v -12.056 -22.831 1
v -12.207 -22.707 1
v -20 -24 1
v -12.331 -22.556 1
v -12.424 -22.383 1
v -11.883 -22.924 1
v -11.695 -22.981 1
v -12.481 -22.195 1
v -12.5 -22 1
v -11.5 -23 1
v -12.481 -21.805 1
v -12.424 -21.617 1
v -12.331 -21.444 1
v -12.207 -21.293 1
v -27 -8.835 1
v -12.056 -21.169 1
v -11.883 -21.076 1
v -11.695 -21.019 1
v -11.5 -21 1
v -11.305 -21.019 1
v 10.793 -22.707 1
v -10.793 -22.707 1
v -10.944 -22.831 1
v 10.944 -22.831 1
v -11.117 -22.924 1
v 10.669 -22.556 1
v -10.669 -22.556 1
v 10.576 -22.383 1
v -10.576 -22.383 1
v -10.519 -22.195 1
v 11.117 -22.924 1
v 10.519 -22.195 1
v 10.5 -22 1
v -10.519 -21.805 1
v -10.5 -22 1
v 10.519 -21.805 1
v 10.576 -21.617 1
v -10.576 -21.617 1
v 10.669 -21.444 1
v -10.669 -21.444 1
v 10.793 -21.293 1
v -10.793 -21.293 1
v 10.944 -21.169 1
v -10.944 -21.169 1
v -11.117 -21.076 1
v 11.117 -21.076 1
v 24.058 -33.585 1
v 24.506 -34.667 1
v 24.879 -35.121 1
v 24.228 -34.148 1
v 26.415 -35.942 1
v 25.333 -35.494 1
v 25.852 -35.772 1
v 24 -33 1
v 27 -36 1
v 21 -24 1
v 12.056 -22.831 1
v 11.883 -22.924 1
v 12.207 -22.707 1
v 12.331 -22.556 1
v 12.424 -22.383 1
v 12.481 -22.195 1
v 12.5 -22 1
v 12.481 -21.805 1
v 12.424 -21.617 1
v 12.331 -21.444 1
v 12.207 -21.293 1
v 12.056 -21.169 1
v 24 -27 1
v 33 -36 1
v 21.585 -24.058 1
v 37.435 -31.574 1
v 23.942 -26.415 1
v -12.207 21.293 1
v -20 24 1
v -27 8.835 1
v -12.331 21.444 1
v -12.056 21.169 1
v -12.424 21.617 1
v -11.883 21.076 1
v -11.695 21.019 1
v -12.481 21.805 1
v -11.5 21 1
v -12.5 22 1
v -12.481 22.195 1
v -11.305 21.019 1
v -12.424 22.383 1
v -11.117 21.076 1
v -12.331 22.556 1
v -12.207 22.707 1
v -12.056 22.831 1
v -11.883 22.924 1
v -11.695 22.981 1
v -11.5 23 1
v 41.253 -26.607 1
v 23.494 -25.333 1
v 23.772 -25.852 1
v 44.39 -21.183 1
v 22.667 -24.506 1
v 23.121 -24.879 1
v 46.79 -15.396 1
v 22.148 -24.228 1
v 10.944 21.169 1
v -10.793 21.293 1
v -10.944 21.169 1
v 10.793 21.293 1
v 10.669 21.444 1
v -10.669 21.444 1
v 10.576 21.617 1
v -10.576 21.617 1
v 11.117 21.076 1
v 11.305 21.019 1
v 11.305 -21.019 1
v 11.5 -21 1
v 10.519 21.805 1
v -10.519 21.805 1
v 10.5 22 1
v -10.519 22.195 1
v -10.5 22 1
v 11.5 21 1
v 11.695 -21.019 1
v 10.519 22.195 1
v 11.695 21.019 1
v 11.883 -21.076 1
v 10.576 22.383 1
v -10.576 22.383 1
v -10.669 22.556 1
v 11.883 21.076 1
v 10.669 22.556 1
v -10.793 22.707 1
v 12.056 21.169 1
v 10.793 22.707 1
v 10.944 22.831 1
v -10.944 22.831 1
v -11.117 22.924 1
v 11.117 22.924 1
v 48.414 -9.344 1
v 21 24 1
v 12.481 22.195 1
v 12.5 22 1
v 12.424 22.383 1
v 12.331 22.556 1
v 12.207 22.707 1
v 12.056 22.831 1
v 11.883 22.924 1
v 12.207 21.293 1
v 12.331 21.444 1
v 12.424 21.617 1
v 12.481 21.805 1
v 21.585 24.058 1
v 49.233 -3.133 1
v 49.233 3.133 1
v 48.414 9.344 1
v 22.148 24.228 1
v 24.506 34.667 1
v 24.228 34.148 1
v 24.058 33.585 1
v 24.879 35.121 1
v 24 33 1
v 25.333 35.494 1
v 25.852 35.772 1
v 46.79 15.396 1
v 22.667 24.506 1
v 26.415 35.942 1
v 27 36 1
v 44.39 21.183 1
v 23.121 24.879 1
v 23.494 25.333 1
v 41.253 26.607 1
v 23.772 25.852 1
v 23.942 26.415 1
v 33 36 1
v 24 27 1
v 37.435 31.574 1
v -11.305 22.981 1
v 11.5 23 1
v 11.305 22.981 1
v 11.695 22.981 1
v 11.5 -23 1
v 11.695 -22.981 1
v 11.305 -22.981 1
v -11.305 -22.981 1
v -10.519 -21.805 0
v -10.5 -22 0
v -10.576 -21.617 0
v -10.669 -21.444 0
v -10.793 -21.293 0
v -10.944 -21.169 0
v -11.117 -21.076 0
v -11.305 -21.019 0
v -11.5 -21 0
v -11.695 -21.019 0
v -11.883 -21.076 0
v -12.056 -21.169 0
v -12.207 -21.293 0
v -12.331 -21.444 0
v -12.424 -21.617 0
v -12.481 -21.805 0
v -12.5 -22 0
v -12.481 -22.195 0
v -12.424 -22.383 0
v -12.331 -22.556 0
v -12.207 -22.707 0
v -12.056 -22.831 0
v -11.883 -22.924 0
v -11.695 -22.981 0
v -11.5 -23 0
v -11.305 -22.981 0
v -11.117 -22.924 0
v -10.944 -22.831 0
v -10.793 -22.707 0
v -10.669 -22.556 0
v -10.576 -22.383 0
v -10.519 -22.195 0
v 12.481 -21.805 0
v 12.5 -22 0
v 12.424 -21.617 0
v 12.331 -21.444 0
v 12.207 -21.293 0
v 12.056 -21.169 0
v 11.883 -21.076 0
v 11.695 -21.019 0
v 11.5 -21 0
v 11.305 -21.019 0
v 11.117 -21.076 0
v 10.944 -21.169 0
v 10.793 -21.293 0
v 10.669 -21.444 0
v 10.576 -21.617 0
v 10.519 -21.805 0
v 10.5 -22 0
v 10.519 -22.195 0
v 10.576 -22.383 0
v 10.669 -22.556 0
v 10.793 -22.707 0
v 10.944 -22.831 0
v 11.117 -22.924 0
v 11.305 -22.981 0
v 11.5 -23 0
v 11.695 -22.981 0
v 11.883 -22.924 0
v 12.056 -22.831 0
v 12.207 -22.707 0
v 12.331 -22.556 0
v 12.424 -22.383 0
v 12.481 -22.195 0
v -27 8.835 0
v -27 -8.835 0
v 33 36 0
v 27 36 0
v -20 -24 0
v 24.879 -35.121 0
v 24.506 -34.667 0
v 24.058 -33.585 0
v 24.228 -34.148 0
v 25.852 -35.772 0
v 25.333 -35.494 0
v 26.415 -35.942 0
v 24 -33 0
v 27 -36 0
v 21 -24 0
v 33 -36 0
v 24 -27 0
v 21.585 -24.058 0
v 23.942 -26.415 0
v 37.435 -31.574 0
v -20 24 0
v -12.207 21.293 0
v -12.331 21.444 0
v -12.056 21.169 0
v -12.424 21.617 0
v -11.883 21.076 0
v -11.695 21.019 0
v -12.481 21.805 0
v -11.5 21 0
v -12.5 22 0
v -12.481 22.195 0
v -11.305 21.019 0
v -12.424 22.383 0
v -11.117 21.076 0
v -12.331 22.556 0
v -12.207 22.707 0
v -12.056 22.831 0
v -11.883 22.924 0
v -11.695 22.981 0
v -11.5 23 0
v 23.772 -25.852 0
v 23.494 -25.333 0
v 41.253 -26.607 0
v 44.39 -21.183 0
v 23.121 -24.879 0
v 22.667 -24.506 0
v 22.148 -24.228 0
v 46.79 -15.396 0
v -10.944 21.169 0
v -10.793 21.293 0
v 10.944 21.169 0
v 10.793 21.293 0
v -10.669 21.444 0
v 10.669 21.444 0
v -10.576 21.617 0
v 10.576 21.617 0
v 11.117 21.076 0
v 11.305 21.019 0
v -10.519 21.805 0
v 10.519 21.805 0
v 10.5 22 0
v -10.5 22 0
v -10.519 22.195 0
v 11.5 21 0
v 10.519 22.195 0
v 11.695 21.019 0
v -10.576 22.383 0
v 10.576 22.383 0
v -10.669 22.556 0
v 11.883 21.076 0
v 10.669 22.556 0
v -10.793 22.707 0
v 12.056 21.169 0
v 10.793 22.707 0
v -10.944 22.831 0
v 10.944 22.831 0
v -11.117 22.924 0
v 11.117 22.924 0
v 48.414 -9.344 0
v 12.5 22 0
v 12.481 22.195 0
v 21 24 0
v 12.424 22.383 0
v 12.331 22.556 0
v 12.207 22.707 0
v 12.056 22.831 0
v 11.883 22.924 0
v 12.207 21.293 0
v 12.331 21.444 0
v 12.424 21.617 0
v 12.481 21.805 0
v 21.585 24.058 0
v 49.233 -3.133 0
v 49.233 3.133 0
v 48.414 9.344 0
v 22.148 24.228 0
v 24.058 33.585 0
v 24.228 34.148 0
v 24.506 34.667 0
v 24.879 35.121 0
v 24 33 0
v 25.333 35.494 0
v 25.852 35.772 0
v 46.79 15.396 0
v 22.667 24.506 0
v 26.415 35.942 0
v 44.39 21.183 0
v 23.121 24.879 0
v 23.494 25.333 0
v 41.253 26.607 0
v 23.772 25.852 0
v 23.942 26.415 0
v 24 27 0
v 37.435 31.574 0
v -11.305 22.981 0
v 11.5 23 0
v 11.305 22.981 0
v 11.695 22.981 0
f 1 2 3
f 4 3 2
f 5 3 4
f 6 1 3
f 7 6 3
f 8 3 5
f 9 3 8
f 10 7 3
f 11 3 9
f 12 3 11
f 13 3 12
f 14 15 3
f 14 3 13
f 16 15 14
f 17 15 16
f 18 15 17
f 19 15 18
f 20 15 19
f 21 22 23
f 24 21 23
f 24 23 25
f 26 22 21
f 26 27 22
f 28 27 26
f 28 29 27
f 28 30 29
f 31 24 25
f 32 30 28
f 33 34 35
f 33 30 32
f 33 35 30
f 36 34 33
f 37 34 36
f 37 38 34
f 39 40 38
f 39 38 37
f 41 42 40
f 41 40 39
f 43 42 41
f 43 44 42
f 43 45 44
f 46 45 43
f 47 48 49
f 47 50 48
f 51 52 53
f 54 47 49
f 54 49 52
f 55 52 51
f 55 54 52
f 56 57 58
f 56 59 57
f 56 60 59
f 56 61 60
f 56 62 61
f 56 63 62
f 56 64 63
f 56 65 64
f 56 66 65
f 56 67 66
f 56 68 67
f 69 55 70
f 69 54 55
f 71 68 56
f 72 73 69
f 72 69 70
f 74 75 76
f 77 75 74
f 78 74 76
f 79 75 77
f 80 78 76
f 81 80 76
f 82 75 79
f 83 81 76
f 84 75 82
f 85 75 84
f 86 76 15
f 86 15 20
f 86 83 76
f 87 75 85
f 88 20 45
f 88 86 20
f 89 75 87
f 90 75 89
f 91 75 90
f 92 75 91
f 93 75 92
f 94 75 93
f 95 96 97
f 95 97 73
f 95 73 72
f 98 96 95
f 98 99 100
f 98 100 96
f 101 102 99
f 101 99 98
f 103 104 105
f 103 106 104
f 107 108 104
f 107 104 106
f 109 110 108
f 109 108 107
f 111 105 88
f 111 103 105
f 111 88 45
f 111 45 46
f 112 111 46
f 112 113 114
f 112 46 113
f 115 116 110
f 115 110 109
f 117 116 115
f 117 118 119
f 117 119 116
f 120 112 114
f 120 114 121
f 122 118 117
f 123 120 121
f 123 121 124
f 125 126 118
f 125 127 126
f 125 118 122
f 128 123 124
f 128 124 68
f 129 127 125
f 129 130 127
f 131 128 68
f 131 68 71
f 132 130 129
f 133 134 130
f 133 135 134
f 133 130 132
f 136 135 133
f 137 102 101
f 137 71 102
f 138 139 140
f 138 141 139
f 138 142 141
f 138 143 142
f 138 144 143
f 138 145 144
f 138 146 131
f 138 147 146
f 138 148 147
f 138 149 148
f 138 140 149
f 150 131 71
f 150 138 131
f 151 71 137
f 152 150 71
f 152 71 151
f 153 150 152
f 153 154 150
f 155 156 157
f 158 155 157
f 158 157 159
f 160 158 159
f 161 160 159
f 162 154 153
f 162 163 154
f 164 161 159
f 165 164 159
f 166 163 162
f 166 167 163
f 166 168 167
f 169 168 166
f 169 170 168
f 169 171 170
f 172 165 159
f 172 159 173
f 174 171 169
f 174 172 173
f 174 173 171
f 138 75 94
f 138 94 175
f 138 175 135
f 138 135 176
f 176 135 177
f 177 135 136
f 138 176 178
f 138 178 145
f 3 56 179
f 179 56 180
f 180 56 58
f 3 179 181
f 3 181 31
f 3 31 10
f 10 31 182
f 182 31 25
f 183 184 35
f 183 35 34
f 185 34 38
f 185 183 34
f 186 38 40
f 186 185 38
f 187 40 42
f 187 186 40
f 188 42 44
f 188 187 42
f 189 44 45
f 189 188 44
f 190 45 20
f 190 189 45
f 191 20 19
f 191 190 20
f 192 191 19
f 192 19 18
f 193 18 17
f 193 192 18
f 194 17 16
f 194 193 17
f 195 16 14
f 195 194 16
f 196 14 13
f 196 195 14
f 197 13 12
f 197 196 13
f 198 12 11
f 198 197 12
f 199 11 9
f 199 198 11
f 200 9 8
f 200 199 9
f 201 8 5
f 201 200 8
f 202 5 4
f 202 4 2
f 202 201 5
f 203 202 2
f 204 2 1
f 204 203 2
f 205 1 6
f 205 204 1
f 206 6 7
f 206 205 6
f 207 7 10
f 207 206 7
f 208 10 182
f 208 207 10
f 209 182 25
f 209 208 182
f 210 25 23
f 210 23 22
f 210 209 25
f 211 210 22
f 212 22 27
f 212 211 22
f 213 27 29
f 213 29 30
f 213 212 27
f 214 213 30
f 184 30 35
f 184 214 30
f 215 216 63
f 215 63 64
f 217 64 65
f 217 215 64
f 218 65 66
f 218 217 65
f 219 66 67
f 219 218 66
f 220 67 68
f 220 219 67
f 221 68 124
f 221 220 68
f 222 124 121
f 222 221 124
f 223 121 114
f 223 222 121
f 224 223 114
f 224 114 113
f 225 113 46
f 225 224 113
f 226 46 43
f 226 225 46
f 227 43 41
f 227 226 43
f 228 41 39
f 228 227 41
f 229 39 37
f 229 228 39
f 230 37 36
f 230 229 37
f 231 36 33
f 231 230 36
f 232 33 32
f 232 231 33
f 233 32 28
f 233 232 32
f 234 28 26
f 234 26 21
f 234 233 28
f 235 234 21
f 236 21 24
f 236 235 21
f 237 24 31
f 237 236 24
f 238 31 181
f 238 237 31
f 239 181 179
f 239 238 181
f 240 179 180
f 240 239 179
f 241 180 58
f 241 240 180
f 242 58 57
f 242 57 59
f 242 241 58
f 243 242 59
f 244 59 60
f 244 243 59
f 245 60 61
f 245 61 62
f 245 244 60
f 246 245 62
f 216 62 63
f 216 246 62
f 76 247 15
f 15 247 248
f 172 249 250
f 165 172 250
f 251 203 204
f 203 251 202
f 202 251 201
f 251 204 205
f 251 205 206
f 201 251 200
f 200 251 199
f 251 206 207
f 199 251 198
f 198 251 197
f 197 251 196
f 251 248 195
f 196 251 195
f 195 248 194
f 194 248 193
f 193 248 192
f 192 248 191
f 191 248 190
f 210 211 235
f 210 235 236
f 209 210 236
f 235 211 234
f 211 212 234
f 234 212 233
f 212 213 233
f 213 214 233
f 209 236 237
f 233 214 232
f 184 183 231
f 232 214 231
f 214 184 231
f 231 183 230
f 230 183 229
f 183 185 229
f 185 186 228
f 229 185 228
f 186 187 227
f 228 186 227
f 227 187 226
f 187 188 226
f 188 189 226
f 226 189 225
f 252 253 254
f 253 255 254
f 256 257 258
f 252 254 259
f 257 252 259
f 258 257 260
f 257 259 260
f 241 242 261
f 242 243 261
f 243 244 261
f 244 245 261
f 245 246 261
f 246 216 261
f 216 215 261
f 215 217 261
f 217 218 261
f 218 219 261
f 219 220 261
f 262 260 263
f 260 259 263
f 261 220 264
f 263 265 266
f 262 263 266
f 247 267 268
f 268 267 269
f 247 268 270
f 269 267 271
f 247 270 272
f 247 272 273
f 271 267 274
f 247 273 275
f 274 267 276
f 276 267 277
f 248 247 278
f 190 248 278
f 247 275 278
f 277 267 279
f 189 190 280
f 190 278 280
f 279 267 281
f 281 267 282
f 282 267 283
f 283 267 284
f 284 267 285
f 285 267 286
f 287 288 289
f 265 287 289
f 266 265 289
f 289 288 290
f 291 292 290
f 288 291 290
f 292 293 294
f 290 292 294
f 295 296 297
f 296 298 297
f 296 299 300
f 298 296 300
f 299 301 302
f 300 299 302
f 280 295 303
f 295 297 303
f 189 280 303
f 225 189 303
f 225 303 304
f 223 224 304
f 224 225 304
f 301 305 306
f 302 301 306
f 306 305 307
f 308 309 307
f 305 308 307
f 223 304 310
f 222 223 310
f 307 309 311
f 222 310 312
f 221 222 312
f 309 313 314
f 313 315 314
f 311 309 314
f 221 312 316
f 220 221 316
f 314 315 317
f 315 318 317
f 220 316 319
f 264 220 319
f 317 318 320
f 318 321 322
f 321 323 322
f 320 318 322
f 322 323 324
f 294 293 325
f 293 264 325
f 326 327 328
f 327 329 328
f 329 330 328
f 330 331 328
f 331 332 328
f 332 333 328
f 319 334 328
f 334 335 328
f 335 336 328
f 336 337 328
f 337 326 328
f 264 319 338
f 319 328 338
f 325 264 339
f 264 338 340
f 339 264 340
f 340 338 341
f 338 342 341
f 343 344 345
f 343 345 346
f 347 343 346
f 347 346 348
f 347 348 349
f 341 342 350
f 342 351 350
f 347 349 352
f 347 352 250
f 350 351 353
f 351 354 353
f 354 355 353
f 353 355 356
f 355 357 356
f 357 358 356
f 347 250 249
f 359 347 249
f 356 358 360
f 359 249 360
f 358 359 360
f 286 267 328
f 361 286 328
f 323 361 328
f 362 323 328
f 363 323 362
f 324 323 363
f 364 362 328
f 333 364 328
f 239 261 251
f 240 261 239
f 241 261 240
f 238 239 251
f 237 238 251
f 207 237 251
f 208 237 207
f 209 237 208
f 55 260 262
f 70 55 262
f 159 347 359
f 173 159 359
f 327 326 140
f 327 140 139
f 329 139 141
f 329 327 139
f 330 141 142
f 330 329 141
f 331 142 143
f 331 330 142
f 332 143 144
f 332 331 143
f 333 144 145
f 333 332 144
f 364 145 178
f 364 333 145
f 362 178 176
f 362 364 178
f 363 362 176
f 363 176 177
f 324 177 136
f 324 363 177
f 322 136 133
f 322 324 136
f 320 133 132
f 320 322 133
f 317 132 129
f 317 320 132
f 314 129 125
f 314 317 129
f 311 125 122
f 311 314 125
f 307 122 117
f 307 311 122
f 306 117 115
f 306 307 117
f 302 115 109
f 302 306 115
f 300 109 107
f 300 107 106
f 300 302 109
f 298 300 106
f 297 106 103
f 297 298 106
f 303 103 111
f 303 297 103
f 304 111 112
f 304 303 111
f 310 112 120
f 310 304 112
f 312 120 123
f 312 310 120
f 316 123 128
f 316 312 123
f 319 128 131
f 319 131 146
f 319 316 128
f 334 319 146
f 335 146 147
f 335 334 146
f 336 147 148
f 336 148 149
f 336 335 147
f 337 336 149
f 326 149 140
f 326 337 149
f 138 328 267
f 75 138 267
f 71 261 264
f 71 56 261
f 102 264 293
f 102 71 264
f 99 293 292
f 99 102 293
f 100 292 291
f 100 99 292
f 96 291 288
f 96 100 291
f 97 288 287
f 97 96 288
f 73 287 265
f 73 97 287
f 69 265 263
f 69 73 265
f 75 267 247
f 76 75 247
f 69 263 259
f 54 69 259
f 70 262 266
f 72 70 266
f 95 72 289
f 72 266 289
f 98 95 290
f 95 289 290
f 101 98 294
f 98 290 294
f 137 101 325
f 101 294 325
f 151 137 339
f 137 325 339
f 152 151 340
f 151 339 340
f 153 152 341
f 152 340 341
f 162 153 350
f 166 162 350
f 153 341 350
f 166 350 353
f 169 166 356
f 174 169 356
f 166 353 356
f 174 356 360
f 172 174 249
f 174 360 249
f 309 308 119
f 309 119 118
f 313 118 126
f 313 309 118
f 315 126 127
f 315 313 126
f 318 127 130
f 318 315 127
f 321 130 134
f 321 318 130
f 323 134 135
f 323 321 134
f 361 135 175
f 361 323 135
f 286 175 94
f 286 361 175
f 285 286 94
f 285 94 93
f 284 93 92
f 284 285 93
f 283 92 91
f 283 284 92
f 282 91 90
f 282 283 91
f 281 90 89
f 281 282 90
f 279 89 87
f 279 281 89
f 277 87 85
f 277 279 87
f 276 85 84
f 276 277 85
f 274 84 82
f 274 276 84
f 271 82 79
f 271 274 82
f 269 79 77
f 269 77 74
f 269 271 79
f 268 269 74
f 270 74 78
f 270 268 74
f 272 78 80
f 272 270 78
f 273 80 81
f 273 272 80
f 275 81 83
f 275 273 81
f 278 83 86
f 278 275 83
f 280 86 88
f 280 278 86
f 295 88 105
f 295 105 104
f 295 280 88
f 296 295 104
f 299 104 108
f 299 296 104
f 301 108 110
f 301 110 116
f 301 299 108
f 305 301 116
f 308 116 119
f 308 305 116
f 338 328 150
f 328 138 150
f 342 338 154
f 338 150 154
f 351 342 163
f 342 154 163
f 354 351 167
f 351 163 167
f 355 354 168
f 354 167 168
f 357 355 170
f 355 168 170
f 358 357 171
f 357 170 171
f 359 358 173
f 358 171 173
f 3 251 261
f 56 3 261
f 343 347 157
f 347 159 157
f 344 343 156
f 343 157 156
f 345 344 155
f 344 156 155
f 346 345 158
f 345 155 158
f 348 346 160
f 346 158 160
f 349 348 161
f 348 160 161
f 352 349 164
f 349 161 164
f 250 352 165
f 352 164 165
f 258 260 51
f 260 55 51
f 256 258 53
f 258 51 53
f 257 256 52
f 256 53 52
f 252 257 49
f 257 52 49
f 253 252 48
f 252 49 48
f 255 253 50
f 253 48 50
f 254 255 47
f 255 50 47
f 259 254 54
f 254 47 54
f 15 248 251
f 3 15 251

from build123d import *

# Parameters (mm, degrees)
F0_R     = 1
F1_DEPTH = 1
F2_R     = 3


with BuildPart() as f1:
    # F0 (on Top) → F1 (new body)
    with BuildSketch(Plane.XY):
        with BuildLine():
            Line((24, 24), (0, 24))
            Line((0, 24), (-20, 24))
            Line((-20, 24), (-27, 8.8345631957))
            Line((-27, 8.8345631957), (-27, 0))
            Line((-27, 0), (-27, -8.8345631957))
            Line((-27, -8.8345631957), (-20, -24))
            Line((-20, -24), (0, -24))
            Line((0, -24), (24, -24))
            Line((24, -24), (24, -36))
            Line((24, -36), (33, -36))
            ThreePointArc((33, -36), (49.3356561573, 0), (33, 36))
            Line((33, 36), (24, 36))
            Line((24, 36), (24, 24))
        make_face()
        with Locations((-11.5, -22)):
            Circle(F0_R, mode=Mode.SUBTRACT)
        with Locations((11.5, -22)):
            Circle(F0_R, mode=Mode.SUBTRACT)
        with Locations((-11.5, 22)):
            Circle(F0_R, mode=Mode.SUBTRACT)
        with Locations((11.5, 22)):
            Circle(F0_R, mode=Mode.SUBTRACT)
    extrude(amount=F1_DEPTH)

    # F2
    f2_edges = [f1.edges().sort_by_distance(p)[0] for p in [
        (24, -24, 0.5),
        (24, -36, 0.5),
        (24, 24, 0.5),
        (24, 36, 0.5),
    ]]
    fillet(f2_edges, radius=F2_R)


solid = f1.part
